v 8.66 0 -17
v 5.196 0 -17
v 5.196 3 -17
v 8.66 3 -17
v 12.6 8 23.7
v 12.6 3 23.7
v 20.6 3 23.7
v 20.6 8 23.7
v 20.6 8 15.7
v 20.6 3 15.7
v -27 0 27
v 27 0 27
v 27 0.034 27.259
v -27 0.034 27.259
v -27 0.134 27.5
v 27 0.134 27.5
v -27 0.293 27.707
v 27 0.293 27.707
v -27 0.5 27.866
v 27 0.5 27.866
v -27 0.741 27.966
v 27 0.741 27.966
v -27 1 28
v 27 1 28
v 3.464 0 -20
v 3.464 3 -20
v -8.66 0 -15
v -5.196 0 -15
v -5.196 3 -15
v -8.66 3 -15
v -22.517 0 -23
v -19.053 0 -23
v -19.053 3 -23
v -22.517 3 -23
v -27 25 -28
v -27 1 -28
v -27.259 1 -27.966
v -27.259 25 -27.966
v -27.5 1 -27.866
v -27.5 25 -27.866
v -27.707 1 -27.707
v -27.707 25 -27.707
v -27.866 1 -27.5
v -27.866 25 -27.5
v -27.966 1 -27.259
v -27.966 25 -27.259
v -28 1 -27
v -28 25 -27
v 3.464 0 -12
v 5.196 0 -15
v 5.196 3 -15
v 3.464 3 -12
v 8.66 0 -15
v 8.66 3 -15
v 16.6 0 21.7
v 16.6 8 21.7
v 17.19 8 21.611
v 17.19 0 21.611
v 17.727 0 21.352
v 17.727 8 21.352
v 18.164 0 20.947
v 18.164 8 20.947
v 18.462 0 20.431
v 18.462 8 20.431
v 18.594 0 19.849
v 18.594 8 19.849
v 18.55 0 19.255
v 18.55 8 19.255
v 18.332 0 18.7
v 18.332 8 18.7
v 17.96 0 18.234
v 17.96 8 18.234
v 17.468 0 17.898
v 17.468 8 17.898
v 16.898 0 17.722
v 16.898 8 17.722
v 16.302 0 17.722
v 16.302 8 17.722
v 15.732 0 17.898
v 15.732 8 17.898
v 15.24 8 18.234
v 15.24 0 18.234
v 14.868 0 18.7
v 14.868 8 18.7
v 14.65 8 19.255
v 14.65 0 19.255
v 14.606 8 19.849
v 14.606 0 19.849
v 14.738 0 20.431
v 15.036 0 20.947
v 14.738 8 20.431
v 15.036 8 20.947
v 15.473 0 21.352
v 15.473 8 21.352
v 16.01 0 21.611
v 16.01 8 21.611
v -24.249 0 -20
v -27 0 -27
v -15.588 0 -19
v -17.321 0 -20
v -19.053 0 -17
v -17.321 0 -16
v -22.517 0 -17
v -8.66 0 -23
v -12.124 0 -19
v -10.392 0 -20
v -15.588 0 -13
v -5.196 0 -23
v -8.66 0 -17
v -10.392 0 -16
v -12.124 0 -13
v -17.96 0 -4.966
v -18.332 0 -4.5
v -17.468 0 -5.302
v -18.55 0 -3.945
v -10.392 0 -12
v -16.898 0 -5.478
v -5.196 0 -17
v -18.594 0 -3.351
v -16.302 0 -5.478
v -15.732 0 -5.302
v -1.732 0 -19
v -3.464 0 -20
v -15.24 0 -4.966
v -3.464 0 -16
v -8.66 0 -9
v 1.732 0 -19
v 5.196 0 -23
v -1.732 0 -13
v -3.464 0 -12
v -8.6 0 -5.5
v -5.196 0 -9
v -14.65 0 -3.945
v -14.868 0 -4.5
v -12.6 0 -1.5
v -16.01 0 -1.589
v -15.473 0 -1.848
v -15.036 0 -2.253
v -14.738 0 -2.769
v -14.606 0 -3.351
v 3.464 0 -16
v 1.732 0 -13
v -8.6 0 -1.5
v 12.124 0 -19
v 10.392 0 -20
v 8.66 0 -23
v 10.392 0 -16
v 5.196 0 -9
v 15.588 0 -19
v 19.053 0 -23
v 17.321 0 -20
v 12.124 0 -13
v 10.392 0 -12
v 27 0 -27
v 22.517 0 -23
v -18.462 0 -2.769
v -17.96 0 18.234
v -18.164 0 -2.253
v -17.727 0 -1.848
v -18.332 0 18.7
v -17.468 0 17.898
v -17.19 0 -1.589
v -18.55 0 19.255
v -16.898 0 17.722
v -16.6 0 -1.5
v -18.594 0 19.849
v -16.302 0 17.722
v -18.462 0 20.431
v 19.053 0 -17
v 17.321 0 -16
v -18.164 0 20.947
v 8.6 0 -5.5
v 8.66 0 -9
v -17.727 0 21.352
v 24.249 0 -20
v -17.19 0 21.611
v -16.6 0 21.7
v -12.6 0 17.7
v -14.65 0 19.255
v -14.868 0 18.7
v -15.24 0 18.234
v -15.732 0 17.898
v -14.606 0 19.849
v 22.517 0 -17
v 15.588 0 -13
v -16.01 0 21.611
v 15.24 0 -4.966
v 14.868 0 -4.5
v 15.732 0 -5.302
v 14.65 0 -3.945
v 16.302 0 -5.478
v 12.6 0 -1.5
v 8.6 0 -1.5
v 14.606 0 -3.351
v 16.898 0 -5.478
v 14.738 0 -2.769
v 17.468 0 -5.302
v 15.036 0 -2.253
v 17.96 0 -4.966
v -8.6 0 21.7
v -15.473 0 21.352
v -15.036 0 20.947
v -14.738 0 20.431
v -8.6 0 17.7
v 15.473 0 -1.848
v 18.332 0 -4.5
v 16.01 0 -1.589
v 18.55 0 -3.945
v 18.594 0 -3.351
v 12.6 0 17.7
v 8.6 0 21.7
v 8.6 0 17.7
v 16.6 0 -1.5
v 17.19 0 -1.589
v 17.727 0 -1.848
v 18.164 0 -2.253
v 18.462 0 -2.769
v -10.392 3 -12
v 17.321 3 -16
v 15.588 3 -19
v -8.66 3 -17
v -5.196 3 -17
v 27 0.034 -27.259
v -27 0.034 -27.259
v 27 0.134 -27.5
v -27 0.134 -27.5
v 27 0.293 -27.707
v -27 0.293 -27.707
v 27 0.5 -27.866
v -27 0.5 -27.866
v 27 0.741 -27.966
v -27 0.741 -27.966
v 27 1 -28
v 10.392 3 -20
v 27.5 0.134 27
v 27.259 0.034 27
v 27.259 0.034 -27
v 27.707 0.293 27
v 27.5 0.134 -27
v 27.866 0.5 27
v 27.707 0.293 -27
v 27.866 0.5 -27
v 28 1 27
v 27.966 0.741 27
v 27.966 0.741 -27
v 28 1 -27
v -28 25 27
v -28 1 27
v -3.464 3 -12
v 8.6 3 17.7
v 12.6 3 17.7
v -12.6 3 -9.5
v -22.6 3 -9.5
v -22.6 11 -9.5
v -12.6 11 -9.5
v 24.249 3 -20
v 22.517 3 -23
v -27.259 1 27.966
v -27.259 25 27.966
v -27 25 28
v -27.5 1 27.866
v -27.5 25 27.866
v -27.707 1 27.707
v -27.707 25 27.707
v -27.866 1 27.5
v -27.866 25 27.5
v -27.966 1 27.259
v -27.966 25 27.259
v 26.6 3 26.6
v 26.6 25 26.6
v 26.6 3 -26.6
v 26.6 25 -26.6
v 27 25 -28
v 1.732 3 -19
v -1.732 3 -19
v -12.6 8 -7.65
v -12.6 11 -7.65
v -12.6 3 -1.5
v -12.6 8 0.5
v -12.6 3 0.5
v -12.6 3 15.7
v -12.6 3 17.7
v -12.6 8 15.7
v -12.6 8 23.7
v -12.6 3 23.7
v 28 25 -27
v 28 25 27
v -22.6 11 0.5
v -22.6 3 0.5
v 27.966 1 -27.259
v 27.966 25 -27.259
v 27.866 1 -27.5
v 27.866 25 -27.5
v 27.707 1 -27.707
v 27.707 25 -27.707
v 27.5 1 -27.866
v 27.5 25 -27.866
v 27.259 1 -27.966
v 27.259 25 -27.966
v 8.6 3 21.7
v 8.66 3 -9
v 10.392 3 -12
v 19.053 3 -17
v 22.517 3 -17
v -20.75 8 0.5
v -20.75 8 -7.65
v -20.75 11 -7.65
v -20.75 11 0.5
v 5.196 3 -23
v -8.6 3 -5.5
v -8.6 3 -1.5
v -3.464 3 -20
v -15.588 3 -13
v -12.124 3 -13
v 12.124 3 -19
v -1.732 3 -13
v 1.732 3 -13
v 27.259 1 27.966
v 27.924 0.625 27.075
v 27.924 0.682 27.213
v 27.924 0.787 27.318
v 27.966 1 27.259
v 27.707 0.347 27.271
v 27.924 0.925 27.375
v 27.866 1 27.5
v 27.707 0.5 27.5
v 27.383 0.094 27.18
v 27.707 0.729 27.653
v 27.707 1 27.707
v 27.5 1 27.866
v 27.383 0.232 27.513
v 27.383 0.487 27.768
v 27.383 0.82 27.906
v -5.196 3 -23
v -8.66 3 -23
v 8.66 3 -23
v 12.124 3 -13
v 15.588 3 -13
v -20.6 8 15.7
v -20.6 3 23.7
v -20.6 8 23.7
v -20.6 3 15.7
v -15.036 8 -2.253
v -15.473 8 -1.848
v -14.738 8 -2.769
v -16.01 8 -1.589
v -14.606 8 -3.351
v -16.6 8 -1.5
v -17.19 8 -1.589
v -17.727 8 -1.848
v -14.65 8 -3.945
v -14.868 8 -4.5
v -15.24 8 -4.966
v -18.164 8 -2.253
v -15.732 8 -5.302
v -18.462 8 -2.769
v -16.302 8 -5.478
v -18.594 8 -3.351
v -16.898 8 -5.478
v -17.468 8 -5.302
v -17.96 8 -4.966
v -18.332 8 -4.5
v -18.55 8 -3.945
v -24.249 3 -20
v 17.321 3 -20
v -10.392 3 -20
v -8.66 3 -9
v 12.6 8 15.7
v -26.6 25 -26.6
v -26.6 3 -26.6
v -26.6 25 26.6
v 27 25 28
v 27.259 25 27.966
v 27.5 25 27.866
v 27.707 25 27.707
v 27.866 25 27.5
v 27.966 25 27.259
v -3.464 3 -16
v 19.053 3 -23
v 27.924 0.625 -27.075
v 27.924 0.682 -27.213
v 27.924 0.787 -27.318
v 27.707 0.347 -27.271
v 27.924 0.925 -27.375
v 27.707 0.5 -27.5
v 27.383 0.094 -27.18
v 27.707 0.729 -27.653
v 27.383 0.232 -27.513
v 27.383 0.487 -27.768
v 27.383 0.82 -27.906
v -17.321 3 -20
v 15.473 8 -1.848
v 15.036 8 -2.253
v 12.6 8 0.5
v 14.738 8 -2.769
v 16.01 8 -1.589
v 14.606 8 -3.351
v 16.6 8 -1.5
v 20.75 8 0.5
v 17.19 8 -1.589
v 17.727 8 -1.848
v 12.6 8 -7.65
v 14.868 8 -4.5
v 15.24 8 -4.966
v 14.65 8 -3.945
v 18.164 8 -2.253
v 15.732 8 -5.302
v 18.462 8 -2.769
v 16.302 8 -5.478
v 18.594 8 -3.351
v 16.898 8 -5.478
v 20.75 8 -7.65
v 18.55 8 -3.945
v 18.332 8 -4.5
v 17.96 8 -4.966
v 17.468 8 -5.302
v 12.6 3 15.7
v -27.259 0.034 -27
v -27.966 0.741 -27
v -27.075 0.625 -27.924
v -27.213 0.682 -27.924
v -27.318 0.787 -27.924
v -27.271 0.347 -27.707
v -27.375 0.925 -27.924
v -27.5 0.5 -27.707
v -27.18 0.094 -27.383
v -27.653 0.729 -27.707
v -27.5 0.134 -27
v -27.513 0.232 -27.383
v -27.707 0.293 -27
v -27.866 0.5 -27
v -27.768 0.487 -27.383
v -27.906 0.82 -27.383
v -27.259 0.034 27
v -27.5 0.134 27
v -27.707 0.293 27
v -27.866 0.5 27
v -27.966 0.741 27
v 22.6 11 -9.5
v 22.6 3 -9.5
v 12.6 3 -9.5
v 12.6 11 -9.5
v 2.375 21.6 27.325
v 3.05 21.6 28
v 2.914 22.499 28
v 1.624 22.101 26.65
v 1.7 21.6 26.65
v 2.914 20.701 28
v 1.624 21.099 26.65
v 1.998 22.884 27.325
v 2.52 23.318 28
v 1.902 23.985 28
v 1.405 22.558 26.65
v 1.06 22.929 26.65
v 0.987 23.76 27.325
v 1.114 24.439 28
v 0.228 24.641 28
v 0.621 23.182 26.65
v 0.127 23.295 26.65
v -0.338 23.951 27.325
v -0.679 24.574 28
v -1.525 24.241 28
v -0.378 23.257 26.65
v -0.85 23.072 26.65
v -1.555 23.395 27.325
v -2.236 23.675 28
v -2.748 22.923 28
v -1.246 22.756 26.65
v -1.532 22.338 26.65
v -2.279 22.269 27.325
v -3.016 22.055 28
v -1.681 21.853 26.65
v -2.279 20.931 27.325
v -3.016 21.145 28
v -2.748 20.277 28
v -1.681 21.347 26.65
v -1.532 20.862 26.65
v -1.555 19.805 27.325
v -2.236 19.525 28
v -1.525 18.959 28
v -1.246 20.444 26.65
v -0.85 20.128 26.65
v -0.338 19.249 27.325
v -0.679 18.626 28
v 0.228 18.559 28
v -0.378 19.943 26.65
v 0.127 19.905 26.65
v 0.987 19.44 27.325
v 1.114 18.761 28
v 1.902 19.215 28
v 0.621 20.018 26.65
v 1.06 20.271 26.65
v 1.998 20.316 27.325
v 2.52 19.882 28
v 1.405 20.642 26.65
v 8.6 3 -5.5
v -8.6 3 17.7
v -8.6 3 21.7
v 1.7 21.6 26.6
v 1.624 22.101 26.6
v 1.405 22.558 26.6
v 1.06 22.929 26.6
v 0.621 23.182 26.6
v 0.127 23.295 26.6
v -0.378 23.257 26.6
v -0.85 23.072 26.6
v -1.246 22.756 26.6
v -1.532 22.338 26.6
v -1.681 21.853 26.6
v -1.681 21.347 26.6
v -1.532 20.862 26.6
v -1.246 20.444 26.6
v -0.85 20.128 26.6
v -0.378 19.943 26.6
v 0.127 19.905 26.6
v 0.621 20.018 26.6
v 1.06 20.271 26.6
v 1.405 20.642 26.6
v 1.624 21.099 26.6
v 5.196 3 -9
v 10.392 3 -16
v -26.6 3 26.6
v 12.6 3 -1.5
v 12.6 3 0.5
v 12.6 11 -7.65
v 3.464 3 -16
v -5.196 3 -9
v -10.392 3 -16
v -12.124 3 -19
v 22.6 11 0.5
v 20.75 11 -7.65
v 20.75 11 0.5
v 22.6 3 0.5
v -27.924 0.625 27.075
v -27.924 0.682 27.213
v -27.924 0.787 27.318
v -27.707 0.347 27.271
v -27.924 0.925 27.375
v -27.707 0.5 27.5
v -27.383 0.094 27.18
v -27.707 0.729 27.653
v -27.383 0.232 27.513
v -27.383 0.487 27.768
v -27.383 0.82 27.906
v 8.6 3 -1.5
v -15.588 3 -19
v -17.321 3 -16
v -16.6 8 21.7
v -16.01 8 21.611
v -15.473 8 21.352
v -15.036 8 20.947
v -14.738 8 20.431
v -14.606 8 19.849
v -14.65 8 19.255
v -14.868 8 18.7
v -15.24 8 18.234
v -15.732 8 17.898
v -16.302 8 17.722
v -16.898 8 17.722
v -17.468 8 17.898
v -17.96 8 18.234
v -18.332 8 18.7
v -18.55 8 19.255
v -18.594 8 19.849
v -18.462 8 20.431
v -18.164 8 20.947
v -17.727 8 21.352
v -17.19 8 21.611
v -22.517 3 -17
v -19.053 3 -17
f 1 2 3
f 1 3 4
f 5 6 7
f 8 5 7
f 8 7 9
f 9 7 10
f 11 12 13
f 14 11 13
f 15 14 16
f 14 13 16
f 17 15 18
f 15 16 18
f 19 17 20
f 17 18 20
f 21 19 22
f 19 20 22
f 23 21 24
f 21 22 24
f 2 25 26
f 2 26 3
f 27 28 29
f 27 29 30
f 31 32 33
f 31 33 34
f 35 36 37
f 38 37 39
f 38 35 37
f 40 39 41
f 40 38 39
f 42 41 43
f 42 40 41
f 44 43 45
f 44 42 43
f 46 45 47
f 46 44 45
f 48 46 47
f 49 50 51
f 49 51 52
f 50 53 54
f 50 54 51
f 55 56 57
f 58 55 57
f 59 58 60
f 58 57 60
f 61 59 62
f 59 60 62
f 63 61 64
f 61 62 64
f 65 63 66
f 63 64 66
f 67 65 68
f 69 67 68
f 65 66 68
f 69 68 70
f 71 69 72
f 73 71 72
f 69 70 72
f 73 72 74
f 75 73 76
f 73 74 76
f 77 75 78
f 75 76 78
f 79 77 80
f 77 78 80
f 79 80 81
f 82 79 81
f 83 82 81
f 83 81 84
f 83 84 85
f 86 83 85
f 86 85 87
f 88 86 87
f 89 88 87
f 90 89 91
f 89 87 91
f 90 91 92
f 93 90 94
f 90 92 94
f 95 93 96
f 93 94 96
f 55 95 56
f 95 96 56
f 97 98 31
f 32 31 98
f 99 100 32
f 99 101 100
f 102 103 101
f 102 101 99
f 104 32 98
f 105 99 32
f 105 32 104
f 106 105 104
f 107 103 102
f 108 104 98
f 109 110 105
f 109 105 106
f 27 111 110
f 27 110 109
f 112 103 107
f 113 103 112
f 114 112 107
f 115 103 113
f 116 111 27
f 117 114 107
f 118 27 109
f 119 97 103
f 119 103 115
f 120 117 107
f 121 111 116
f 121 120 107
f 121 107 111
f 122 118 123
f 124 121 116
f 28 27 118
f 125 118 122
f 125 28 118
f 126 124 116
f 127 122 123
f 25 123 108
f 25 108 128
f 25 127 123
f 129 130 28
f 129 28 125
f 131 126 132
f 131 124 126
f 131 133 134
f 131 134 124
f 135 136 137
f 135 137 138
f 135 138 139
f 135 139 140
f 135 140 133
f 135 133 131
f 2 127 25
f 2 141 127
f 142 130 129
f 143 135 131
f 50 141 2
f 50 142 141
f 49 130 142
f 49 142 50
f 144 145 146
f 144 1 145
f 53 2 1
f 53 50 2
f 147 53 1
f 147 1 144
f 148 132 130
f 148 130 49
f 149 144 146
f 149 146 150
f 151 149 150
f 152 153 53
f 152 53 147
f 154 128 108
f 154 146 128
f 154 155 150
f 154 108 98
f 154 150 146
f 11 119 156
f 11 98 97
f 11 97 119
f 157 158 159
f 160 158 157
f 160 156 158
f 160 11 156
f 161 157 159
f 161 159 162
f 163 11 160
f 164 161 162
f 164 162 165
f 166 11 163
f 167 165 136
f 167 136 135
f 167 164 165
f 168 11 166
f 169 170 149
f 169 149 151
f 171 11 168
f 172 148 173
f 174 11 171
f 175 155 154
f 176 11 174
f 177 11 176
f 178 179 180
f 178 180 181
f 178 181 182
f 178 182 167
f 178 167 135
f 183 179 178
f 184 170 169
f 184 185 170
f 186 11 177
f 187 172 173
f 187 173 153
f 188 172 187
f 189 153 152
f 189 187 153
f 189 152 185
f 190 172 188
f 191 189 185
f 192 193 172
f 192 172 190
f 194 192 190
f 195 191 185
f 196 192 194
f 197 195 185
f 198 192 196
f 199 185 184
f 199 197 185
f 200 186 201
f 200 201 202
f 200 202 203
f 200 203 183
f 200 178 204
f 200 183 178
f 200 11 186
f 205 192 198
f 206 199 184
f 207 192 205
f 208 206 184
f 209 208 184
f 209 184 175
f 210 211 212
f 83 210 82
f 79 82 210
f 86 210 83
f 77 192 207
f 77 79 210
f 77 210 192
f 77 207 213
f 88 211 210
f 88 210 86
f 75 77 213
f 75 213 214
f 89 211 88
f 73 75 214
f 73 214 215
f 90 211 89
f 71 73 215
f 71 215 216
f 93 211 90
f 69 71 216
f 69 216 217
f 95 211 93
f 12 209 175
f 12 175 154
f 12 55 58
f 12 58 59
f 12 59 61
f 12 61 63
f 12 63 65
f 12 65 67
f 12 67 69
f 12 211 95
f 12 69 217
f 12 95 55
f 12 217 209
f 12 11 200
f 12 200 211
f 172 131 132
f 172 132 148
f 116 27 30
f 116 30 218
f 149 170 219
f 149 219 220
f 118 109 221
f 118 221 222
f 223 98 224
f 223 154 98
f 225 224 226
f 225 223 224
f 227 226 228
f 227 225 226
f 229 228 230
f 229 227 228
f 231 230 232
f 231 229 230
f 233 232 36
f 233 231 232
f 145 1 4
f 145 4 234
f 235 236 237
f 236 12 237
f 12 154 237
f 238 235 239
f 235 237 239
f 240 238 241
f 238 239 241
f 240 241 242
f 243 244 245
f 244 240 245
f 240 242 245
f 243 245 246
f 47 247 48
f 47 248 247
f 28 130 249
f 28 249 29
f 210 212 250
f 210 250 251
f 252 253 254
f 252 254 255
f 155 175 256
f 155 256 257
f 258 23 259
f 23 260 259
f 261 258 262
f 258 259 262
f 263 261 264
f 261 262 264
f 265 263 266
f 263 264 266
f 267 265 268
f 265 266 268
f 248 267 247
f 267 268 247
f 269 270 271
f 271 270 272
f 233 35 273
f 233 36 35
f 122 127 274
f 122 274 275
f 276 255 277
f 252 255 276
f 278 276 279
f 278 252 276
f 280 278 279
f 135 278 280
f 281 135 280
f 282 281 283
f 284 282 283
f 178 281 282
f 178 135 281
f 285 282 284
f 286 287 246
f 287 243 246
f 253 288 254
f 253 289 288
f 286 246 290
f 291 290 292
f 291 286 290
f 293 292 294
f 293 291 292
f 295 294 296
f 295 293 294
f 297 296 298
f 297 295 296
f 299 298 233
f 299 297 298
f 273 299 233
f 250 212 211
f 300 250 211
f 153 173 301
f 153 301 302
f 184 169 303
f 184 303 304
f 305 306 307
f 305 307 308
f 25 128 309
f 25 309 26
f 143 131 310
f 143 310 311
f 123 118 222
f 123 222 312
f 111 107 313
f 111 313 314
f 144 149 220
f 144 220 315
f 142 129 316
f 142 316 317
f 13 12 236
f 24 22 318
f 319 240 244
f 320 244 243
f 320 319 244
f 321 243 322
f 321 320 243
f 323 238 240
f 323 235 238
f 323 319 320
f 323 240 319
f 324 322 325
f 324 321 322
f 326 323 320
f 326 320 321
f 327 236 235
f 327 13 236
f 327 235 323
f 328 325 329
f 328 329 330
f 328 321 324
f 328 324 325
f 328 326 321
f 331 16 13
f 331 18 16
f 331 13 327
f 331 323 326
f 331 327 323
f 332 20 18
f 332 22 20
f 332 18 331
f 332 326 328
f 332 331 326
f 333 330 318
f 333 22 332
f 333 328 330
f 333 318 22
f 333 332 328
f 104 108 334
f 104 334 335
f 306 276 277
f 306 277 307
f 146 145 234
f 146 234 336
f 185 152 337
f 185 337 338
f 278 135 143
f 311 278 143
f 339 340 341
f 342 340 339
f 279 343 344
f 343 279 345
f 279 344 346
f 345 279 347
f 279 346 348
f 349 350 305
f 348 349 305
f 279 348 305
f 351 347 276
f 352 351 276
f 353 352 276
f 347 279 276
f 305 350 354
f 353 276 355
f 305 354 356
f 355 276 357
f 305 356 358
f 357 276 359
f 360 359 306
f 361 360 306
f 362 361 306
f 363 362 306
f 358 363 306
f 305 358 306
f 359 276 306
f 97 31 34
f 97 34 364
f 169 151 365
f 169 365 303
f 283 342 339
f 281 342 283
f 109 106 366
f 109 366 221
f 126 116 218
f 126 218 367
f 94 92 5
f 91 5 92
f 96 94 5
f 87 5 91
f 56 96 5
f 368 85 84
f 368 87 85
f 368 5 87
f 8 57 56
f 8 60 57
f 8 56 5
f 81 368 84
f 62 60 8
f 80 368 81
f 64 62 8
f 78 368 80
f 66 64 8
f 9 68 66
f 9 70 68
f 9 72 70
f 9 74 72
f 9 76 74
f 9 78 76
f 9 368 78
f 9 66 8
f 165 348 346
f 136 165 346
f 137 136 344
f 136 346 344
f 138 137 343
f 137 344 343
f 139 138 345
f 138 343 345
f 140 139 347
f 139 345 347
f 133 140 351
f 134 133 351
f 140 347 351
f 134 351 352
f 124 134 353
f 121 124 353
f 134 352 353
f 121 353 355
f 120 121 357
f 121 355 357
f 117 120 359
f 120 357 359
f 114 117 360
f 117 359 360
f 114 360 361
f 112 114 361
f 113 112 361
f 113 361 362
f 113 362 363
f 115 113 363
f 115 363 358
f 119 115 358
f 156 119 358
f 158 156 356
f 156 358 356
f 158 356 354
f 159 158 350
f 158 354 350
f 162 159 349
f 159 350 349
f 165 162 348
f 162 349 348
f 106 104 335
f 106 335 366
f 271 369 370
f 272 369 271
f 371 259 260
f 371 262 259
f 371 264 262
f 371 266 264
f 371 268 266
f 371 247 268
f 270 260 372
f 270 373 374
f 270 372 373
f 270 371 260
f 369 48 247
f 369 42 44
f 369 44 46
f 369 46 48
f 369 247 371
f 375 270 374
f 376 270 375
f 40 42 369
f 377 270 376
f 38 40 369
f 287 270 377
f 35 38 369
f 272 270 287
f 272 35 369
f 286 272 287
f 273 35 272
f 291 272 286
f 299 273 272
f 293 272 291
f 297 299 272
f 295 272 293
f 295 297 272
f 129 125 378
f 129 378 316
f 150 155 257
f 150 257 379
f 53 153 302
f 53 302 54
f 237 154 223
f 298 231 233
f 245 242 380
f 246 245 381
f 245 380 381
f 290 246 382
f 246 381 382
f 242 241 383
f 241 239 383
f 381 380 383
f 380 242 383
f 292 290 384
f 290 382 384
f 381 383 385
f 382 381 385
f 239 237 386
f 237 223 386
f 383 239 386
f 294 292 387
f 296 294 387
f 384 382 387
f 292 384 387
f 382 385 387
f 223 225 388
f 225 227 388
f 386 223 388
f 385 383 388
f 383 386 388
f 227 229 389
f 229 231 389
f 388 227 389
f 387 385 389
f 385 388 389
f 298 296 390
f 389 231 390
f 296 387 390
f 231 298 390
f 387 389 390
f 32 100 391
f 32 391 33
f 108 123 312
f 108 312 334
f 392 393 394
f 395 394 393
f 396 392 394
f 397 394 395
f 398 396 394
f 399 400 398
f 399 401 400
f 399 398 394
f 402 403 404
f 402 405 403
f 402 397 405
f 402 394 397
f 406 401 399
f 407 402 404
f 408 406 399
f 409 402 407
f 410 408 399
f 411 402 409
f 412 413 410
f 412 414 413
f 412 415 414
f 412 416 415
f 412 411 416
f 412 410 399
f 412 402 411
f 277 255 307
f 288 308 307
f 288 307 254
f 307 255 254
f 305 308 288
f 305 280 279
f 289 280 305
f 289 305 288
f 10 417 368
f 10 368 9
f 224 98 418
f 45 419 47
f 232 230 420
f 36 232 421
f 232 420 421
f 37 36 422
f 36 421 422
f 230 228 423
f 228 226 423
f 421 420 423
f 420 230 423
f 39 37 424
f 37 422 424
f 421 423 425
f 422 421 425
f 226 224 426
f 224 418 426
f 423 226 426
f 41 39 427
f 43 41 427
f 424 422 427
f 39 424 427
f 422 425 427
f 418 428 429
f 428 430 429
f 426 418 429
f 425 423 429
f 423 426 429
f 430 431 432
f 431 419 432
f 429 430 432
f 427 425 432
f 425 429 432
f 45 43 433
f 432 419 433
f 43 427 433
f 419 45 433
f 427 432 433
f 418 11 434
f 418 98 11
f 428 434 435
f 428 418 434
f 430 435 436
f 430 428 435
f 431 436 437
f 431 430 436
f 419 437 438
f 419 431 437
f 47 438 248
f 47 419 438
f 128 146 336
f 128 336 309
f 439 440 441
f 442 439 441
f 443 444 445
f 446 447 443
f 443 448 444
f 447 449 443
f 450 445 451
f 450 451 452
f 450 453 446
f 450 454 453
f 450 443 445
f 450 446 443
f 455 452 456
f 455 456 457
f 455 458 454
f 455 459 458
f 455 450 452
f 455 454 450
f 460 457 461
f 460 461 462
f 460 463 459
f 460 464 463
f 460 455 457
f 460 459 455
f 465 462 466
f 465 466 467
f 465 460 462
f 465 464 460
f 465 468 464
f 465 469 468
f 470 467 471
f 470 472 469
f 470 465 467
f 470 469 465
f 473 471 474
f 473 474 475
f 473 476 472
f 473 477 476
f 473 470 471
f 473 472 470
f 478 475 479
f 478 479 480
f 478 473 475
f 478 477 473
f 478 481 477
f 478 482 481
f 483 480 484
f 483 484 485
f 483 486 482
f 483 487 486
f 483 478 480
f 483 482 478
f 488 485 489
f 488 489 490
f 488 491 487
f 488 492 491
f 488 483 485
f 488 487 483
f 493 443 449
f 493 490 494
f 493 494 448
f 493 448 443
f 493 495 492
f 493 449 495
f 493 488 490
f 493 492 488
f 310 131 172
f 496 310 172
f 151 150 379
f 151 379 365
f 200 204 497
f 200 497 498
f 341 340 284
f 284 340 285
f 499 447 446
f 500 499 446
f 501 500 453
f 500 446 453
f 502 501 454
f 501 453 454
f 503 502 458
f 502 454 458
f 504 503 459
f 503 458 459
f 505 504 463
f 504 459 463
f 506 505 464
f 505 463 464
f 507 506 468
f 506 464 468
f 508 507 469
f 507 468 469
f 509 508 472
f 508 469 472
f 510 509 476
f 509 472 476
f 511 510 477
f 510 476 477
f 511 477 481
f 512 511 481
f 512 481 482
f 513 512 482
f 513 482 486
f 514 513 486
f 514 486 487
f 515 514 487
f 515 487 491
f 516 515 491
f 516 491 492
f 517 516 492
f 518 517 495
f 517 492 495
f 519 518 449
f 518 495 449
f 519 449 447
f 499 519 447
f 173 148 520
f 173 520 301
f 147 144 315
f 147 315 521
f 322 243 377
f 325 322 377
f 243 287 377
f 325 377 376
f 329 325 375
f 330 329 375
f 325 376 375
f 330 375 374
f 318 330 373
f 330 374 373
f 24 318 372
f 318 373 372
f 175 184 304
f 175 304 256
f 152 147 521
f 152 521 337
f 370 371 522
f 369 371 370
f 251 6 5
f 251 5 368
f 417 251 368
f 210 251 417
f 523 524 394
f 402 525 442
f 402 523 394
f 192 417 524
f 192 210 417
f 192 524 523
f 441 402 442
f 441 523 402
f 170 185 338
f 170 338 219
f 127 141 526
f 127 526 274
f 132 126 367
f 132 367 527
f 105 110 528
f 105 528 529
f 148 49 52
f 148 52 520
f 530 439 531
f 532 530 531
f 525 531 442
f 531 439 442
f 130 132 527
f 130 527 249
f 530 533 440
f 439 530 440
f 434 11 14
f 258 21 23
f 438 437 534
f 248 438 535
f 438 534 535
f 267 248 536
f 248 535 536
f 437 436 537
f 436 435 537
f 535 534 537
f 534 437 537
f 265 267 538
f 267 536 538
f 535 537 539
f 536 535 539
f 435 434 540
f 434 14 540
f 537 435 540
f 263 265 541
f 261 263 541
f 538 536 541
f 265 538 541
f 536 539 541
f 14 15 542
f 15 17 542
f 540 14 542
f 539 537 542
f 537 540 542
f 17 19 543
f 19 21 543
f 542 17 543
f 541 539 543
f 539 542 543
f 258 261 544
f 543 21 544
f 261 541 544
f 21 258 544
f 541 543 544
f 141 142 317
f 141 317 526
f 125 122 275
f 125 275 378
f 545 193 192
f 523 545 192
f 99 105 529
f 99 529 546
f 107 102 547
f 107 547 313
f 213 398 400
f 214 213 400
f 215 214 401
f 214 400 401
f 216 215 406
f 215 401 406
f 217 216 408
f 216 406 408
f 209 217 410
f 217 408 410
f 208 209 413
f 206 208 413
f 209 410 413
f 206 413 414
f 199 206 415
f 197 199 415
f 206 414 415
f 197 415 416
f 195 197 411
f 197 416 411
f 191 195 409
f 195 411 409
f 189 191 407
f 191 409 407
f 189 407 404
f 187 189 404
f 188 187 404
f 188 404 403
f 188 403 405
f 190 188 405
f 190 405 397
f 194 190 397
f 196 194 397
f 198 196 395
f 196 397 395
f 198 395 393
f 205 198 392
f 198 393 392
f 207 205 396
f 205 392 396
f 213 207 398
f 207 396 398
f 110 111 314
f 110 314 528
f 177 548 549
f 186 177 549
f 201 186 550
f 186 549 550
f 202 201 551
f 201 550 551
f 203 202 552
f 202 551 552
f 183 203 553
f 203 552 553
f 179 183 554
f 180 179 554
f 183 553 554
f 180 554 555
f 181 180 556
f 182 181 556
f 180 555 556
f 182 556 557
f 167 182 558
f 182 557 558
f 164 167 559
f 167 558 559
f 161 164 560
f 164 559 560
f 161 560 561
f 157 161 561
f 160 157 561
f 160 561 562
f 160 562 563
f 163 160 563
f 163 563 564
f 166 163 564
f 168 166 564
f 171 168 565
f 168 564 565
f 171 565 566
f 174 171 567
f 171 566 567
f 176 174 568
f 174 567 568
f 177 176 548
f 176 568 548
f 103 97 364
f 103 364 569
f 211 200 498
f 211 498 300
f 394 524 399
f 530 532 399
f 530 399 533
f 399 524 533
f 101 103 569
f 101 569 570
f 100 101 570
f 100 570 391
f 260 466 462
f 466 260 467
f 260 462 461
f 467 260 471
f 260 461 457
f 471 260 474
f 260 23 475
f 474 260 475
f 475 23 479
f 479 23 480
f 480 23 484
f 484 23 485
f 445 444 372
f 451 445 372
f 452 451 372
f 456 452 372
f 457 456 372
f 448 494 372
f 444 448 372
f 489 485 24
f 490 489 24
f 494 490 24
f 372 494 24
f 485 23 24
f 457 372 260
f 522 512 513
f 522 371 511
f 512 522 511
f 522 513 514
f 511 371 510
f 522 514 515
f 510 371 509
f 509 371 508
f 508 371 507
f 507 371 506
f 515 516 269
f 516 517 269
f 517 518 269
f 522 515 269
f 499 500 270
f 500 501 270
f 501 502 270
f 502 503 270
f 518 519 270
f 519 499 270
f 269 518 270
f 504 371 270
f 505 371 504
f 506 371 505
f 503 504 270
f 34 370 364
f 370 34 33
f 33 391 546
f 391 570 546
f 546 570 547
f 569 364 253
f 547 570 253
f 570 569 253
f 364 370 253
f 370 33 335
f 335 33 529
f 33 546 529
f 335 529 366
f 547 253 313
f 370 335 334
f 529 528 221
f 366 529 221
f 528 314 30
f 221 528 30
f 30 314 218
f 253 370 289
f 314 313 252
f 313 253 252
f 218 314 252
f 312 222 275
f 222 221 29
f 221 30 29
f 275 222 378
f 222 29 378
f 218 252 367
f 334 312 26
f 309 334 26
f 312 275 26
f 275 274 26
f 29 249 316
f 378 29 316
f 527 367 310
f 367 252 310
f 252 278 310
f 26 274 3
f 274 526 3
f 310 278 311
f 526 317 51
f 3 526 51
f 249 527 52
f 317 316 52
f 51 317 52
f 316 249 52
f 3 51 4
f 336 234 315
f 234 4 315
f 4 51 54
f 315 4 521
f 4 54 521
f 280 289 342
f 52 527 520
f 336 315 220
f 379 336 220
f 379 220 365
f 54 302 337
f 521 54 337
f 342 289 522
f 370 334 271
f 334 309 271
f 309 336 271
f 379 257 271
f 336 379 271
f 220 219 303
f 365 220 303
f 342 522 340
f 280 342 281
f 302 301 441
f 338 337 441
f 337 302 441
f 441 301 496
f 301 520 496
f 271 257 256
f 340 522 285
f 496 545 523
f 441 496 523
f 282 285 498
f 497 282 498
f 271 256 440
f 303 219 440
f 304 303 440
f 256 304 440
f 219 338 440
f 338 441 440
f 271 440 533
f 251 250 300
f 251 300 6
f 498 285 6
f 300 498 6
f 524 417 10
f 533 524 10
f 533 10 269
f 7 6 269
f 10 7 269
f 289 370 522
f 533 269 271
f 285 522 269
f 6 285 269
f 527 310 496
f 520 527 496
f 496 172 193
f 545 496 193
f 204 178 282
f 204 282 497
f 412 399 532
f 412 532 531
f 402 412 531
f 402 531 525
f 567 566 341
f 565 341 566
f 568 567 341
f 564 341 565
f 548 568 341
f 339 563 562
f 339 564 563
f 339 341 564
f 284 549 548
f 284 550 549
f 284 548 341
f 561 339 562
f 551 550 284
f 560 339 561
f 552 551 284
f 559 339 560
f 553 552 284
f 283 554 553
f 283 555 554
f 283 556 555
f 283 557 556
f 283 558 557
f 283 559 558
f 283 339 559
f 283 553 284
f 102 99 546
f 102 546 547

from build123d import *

# Parameters (mm, degrees)
SKETCH1_W           = 56
SKETCH1_H           = 56
BOSS_EXTRUDE1_DEPTH = 25
SKETCH2_W           = 53.2
SKETCH2_H           = 53.2
CUT_EXTRUDE1_DEPTH  = 22
SKETCH3_R           = 1.7
CUT_EXTRUDE2_DEPTH  = 1.4
SKETCH4_W           = 25.2
SKETCH4_H           = 27.2
CUT_EXTRUDE3_DEPTH  = 3
SKETCH5_W           = 4
SKETCH5_H           = 4
BOSS_EXTRUDE2_DEPTH = 3
SKETCH6_W           = 8
SKETCH6_H           = 8
BOSS_EXTRUDE3_DEPTH = 5
SKETCH7_R           = 2
CUT_EXTRUDE4_DEPTH  = 8
BOSS_EXTRUDE4_DEPTH = 3
FILLET1_R           = 1
CHAMFER1_SIZE       = 1.35
FILL_PATTERN1_DEPTH = 3


# Read off the part's stored shape, not the designer's step: Fill Pattern1
with BuildPart() as part:
    # Sketch1 → Boss-Extrude1 (new body)
    with BuildSketch(Plane(origin=(0, 0, 0), x_dir=(1, 0, 0), z_dir=(0, 1, 0))):
        Rectangle(SKETCH1_W, SKETCH1_H)
    extrude(amount=BOSS_EXTRUDE1_DEPTH)

    # Sketch2 → Cut-Extrude1 (cut)
    with BuildSketch(Plane(origin=(0, 25, 0), x_dir=(1, 0, 0), z_dir=(0, 1, 0))):
        Rectangle(SKETCH2_W, SKETCH2_H)
    extrude(amount=-CUT_EXTRUDE1_DEPTH, mode=Mode.SUBTRACT)

    # Sketch3 → Cut-Extrude2 (cut)
    with BuildSketch(Plane.XY.offset(28)):
        with Locations((0, 21.6)):
            Circle(SKETCH3_R)
    extrude(amount=-CUT_EXTRUDE2_DEPTH, mode=Mode.SUBTRACT)

    # Sketch4 → Cut-Extrude3 (cut)
    with BuildSketch(Plane.XZ):
        with Locations((0, 8.1)):
            Rectangle(SKETCH4_W, SKETCH4_H)
    extrude(amount=-CUT_EXTRUDE3_DEPTH, mode=Mode.SUBTRACT)

    # Sketch5 → Boss-Extrude2 (add)
    with BuildSketch(Plane.XZ):
        with Locations((-10.6, 19.7)):
            Rectangle(SKETCH5_W, SKETCH5_H)
        with Locations((10.6, 19.7)):
            Rectangle(SKETCH5_W, SKETCH5_H)
        with Locations((10.6, -3.5)):
            Rectangle(SKETCH5_W, SKETCH5_H)
        with Locations((-10.6, -3.5)):
            Rectangle(SKETCH5_W, SKETCH5_H)
    extrude(amount=-BOSS_EXTRUDE2_DEPTH)

    # Sketch6 → Boss-Extrude3 (add)
    with BuildSketch(Plane(origin=(0, 3, 0), x_dir=(1, 0, 0), z_dir=(0, 1, 0))):
        with Locations((16.6, -19.7)):
            Rectangle(SKETCH6_W, SKETCH6_H)
        with Locations((-16.6, -19.7)):
            Rectangle(SKETCH6_W, SKETCH6_H)
        Polygon((12.6, -0.5), (20.6, -0.5), (22.6, -0.5), (22.6, 9.5), (12.6, 9.5), (12.6, 7.5), align=None)
        Polygon((-12.6, -0.5), (-20.6, -0.5), (-22.6, -0.5), (-22.6, 9.5), (-12.6, 9.5), (-12.6, 7.5), align=None)
    extrude(amount=BOSS_EXTRUDE3_DEPTH)

    # Sketch7 → Cut-Extrude4 (cut)
    with BuildSketch(Plane(origin=(0, 8, 0), x_dir=(1, 0, 0), z_dir=(0, 1, 0))):
        with Locations(Location((16.6, -19.7, 0), (0, 0, 270))):
            Circle(SKETCH7_R)
        with Locations(Location((-16.6, -19.7, 0), (0, 0, 270))):
            Circle(SKETCH7_R)
        with Locations(Location((16.6, 3.5, 0), (0, 0, 270))):
            Circle(SKETCH7_R)
        with Locations(Location((-16.6, 3.5, 0), (0, 0, 270))):
            Circle(SKETCH7_R)
    extrude(amount=-CUT_EXTRUDE4_DEPTH, mode=Mode.SUBTRACT)

    # Sketch9 → Boss-Extrude4 (add)
    with BuildSketch(Plane(origin=(0, 8, 0), x_dir=(1, 0, 0), z_dir=(0, 1, 0))):
        Polygon((-22.6, -0.5), (-22.6, 9.5), (-12.6, 9.5), (-12.6, 7.65), (-20.75, 7.65), (-20.75, -0.5), align=None)
        Polygon((12.6, 9.5), (22.6, 9.5), (22.6, -0.5), (20.75, -0.5), (20.75, 7.65), (12.6, 7.65), align=None)
    extrude(amount=BOSS_EXTRUDE4_DEPTH)

    # Fillet1
    fillet1_edges = [part.edges().sort_by_distance(p)[0] for p in [
        (0, 0, 28),
        (-28, 0, 0),
        (0, 0, -28),
        (28, 0, 0),
        (28, 12.5, 28),
        (-28, 12.5, 28),
        (-28, 12.5, -28),
        (28, 12.5, -28),
    ]]
    fillet(fillet1_edges, radius=FILLET1_R)

    # Chamfer1
    chamfer1_edges = [part.edges().sort_by_distance(p)[0] for p in [
        (-1.7, 21.6, 28),
    ]]
    chamfer(chamfer1_edges, length=CHAMFER1_SIZE)

    # Fill Pattern1 outline → Fill Pattern1 (cut)
    with BuildSketch(Plane(origin=(0, 0, 0), x_dir=(1, 0, 0), z_dir=(0, 1, 0))):
        Polygon((22.516660498, 17), (24.248711306, 20), (22.516660498, 23), (19.052558883, 23), (17.320508076, 20), (19.052558883, 17), align=None)
        Polygon((8.660254038, 23), (5.196152423, 23), (3.464101615, 20), (5.196152423, 17), (8.660254038, 17), (10.392304845, 20), align=None)
        Polygon((-5.196152423, 23), (-8.660254038, 23), (-10.392304845, 20), (-8.660254038, 17), (-5.196152423, 17), (-3.464101615, 20), align=None)
        Polygon((-19.052558883, 23), (-22.516660498, 23), (-24.248711306, 20), (-22.516660498, 17), (-19.052558883, 17), (-17.320508076, 20), align=None)
        Polygon((1.732050808, 13), (3.464101615, 16), (1.732050808, 19), (-1.732050808, 19), (-3.464101615, 16), (-1.732050808, 13), align=None)
        Polygon((-12.124355653, 19), (-15.588457268, 19), (-17.320508076, 16), (-15.588457268, 13), (-12.124355653, 13), (-10.392304845, 16), align=None)
        Polygon((15.588457268, 19), (12.124355653, 19), (10.392304845, 16), (12.124355653, 13), (15.588457268, 13), (17.320508076, 16), align=None)
        Polygon((8.660254038, 9), (10.392304845, 12), (8.660254038, 15), (5.196152423, 15), (3.464101615, 12), (5.196152423, 9), align=None)
        Polygon((-5.196152423, 15), (-8.660254038, 15), (-10.392304845, 12), (-8.660254038, 9), (-5.196152423, 9), (-3.464101615, 12), align=None)
    extrude(amount=FILL_PATTERN1_DEPTH, mode=Mode.SUBTRACT)


solid = part.part
